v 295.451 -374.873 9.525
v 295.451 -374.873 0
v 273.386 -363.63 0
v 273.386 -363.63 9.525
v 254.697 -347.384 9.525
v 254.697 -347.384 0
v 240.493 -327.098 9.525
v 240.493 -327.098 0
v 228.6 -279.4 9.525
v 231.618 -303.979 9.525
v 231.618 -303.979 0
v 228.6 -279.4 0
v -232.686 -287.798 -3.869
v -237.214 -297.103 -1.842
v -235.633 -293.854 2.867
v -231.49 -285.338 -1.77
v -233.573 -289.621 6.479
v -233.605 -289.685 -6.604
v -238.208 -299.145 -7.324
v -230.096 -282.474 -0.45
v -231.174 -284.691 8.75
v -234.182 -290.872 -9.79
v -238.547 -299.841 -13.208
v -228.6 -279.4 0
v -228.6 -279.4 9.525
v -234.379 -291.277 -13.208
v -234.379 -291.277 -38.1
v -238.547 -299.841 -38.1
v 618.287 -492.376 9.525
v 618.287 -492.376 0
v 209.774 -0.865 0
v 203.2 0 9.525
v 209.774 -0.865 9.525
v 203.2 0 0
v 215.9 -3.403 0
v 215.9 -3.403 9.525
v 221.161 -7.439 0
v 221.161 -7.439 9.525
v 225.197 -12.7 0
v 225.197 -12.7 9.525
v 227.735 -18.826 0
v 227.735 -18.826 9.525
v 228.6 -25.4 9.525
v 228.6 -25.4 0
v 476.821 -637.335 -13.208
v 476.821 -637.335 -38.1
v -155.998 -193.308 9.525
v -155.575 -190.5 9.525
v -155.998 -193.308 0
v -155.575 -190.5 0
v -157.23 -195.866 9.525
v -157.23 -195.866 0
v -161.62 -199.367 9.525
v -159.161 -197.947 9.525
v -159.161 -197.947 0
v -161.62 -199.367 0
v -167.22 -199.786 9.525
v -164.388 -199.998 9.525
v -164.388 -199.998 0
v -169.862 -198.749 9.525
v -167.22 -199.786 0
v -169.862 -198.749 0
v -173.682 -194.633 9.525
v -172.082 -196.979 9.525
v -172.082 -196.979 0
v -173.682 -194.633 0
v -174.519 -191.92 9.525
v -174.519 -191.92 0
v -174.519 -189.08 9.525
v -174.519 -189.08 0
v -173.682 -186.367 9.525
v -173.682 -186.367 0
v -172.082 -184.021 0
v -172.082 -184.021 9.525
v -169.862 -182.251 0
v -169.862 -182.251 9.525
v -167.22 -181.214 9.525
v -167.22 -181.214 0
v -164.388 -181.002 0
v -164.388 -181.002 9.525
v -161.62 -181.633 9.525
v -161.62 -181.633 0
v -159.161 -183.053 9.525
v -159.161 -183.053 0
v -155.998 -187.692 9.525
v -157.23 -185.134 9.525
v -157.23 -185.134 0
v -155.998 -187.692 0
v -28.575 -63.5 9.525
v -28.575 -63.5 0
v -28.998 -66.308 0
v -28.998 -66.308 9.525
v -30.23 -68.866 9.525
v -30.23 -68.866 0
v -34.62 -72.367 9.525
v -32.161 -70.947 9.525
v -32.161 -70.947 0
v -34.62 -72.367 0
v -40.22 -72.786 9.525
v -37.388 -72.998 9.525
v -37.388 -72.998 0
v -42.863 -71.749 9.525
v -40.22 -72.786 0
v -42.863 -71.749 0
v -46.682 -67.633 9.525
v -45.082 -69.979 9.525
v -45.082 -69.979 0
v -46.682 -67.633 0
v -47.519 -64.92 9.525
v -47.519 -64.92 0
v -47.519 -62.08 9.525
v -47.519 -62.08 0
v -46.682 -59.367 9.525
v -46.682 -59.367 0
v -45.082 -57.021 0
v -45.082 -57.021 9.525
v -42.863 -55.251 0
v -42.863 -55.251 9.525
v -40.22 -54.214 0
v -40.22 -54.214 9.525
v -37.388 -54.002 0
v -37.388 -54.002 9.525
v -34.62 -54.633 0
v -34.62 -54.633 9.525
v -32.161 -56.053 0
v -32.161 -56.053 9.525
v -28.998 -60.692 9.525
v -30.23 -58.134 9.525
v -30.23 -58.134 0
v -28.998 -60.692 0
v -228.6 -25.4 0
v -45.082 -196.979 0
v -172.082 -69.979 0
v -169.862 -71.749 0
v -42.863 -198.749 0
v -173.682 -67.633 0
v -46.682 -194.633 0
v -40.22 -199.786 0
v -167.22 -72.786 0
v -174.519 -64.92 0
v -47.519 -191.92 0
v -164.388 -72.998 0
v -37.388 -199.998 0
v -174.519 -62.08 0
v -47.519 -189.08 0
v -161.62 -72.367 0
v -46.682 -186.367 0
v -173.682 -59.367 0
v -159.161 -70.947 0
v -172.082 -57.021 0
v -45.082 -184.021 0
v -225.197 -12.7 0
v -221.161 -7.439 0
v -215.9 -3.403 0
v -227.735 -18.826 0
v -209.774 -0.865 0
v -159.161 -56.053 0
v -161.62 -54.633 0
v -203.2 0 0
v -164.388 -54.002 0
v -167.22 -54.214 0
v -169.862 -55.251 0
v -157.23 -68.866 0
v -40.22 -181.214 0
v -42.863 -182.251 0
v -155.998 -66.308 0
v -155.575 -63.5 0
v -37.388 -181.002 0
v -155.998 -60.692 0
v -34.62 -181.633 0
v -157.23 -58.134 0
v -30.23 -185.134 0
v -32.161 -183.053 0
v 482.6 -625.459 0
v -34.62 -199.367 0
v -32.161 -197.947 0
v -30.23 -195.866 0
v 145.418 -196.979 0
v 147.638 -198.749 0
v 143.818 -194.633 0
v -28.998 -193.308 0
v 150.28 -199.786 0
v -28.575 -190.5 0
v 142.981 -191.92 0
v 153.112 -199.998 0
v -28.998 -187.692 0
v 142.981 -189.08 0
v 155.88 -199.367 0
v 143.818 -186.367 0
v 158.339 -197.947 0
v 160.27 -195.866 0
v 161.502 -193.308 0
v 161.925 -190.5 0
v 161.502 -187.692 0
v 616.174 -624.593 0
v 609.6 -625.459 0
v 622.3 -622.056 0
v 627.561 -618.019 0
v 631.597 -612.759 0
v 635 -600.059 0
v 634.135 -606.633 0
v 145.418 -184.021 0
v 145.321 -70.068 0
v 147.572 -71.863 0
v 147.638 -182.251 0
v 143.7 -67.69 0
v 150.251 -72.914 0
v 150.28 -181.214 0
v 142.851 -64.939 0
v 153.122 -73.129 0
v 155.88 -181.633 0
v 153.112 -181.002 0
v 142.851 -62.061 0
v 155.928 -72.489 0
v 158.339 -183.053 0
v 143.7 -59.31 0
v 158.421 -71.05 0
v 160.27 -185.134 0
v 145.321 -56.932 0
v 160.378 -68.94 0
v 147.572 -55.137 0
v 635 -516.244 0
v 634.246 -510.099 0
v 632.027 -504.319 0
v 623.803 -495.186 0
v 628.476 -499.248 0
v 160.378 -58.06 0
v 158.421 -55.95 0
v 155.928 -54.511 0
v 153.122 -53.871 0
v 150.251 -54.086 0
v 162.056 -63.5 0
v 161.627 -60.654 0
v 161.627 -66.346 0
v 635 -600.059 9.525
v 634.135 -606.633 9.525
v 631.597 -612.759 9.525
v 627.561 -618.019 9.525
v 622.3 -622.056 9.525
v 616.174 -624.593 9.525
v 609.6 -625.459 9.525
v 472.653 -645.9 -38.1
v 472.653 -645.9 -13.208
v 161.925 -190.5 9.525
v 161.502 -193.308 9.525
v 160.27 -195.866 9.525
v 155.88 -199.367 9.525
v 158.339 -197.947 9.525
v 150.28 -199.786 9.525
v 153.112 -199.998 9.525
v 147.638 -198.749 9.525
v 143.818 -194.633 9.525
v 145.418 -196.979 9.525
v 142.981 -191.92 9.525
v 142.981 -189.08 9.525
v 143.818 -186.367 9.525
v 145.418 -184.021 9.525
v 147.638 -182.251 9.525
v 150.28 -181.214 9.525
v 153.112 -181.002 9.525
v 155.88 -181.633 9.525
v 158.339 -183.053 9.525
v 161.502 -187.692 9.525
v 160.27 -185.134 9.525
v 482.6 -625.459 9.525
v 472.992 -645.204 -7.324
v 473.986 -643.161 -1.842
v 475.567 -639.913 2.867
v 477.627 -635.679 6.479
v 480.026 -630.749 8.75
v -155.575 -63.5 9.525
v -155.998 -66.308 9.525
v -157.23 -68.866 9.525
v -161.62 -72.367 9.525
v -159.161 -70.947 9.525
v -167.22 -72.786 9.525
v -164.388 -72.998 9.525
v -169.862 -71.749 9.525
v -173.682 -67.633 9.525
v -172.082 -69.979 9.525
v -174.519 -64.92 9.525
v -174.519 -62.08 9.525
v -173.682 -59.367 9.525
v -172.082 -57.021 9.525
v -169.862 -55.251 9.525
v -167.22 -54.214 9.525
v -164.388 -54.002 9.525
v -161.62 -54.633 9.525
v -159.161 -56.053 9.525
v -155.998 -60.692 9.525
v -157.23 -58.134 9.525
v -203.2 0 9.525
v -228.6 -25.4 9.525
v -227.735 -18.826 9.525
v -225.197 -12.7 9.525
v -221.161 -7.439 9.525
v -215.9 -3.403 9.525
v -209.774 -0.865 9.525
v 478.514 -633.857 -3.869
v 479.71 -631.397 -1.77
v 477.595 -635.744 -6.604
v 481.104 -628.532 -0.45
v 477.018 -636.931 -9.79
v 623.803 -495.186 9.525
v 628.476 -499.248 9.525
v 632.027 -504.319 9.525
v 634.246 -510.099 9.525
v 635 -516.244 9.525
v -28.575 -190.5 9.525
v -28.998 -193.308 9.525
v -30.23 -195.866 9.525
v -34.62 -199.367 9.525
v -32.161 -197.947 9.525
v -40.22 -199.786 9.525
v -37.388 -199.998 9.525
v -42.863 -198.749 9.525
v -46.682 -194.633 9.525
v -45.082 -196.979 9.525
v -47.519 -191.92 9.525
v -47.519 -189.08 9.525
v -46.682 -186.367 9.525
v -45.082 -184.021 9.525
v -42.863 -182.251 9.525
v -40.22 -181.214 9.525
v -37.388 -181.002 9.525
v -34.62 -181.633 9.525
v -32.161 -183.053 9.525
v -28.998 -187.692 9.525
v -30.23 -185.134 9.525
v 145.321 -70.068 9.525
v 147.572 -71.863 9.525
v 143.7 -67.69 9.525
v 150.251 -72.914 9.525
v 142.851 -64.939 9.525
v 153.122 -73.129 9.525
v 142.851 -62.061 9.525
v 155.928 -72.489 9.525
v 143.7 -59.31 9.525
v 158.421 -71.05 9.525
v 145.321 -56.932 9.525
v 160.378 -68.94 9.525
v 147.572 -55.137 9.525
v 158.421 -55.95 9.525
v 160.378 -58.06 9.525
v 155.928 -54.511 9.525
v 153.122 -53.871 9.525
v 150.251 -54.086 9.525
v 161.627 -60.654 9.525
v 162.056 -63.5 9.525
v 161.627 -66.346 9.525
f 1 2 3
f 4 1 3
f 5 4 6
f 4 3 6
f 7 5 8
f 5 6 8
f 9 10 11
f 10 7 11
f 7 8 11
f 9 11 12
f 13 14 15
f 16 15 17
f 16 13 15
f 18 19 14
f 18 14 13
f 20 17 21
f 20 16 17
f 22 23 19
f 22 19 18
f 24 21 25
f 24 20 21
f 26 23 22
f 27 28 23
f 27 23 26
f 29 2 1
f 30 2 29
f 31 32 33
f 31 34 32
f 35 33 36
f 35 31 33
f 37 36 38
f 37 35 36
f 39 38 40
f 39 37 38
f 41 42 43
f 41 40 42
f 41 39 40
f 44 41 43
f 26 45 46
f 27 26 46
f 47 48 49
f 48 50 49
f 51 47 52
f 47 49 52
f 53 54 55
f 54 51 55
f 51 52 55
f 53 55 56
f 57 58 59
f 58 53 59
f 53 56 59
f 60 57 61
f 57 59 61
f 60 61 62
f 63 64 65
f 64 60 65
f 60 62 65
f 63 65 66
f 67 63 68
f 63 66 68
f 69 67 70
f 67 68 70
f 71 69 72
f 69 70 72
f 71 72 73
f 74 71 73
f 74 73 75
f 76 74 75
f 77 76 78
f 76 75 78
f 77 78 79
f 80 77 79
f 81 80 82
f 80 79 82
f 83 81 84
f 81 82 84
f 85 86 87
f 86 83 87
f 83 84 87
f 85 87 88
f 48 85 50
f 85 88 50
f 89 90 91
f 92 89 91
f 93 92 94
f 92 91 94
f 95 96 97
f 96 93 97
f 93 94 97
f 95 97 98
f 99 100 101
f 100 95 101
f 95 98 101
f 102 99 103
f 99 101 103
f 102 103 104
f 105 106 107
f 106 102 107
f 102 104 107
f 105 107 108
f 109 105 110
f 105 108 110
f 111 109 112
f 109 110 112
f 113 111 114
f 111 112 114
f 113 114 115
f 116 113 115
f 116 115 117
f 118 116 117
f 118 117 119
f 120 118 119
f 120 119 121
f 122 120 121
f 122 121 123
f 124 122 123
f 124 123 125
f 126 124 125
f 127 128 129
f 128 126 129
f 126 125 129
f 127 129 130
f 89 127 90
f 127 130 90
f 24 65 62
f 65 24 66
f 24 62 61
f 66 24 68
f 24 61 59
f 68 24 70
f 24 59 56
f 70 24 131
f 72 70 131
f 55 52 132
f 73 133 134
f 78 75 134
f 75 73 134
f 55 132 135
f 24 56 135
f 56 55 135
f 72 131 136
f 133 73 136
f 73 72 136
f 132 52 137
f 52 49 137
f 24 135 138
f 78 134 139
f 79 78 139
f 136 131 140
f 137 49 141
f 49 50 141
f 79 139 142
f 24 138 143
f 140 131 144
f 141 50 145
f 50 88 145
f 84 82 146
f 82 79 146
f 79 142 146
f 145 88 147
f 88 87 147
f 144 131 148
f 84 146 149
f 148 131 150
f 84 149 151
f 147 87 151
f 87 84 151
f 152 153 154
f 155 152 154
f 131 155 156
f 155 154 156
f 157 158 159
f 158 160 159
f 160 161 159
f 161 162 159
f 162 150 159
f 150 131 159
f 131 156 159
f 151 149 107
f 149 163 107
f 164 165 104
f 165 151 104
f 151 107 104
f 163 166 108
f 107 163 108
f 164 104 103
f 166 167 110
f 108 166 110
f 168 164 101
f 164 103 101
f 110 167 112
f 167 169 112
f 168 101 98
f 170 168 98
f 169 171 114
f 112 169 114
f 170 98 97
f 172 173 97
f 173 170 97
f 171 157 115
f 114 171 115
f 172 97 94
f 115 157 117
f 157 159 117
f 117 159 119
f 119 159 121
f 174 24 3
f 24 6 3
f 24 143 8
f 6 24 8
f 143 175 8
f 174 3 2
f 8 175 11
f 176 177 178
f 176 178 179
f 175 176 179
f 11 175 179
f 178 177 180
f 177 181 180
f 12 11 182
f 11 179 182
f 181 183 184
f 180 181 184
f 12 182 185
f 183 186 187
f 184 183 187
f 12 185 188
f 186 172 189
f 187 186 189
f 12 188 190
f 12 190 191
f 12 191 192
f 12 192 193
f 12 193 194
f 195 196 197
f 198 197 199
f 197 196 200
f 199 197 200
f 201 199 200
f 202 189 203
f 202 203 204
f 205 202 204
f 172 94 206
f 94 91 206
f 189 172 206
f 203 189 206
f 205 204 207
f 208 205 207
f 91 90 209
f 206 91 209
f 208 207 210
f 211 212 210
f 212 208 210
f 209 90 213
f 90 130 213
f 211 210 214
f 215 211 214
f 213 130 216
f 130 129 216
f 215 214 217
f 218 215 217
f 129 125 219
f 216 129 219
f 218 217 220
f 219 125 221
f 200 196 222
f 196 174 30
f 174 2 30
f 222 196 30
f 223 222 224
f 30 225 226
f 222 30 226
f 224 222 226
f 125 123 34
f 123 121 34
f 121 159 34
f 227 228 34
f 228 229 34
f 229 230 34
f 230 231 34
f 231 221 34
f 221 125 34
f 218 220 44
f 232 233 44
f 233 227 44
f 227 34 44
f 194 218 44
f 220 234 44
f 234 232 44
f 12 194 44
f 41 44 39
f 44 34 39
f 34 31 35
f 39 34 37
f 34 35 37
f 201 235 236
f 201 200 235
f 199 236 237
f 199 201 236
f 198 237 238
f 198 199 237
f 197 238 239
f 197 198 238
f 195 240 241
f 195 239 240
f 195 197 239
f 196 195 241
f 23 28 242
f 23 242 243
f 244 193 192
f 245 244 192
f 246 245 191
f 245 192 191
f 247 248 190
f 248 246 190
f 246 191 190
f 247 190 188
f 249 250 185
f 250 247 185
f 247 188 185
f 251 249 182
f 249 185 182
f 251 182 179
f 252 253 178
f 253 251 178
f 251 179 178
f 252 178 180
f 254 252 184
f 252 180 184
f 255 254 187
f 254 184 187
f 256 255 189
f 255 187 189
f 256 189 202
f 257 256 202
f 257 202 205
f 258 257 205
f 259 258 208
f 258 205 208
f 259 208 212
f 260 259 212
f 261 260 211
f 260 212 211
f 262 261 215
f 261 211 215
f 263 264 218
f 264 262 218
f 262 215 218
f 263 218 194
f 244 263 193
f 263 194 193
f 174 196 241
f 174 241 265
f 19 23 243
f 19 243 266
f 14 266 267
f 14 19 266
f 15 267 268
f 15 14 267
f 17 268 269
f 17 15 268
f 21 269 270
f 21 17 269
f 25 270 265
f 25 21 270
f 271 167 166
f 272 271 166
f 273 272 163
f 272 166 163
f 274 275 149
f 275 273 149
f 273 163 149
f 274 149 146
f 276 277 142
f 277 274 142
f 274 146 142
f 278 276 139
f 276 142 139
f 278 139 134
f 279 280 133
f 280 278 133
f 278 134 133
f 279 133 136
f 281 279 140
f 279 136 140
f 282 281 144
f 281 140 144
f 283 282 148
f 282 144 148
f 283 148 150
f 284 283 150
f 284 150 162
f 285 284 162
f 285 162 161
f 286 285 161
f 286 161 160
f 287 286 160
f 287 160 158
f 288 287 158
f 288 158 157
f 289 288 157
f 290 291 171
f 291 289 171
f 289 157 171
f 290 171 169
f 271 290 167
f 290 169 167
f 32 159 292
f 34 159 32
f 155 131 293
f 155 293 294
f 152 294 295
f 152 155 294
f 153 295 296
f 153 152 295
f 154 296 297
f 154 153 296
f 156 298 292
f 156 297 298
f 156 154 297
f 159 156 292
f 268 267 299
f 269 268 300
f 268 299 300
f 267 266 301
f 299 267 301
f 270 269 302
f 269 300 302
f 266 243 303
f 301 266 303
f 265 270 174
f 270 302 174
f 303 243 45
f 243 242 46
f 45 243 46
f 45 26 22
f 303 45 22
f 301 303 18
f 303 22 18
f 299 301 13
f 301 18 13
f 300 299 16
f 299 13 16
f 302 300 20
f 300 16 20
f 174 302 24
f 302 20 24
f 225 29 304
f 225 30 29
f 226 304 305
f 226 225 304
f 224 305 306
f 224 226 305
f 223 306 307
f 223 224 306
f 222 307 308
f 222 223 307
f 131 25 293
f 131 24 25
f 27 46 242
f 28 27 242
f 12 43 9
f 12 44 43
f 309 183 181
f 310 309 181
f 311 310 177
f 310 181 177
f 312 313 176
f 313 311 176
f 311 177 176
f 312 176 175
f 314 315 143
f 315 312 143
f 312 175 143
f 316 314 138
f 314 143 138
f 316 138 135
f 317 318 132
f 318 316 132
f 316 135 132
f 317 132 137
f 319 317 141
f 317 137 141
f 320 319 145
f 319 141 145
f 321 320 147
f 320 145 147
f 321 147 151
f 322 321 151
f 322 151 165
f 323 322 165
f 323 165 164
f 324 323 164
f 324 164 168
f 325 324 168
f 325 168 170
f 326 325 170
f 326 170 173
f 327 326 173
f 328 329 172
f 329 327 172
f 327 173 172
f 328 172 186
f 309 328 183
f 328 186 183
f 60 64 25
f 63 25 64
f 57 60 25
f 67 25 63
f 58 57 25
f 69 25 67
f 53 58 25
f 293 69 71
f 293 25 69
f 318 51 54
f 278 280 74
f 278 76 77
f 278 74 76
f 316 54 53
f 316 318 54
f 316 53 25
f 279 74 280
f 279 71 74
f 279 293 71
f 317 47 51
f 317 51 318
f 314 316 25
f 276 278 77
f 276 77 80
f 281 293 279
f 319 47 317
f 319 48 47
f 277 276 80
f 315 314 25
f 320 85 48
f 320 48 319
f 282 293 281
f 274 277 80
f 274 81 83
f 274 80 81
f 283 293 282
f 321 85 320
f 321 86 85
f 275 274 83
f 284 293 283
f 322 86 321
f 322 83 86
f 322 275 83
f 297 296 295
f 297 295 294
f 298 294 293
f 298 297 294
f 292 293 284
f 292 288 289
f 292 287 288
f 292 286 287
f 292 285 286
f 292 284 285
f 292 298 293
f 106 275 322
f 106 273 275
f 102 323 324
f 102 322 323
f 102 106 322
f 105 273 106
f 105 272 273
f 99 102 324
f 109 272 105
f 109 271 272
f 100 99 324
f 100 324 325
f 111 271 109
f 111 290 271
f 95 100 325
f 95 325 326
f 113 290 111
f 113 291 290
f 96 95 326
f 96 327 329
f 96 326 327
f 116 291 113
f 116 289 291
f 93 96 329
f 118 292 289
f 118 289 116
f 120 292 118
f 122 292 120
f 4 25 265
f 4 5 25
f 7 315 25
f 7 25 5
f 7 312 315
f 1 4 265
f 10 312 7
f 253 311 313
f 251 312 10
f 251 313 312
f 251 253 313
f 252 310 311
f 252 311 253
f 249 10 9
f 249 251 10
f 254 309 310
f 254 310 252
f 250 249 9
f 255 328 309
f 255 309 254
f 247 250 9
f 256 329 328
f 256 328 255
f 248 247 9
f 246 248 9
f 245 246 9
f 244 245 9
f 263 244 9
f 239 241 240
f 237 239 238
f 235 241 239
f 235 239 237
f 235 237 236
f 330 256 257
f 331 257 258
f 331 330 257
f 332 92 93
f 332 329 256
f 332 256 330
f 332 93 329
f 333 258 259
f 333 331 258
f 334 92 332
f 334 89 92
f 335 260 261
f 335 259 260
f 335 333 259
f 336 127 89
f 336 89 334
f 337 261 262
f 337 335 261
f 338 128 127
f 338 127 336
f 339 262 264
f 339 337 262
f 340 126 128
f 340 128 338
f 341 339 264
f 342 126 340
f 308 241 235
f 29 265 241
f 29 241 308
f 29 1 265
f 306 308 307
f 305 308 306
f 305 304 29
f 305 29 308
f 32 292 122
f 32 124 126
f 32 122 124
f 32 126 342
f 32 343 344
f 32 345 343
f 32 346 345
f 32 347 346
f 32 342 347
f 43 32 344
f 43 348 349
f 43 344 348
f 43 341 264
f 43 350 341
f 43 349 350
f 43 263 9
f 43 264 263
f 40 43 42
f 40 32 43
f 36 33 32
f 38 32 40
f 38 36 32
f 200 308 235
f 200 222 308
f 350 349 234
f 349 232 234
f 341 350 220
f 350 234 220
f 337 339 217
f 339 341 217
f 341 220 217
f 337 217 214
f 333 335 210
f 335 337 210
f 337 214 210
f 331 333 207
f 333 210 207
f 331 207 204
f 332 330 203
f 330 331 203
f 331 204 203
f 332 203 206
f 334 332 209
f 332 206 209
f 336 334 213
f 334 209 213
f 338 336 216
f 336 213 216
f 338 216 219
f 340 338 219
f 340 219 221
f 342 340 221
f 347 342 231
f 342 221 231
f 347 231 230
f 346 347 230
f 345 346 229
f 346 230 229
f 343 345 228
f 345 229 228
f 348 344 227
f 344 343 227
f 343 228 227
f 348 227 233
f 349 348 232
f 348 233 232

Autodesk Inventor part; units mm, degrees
ref_plane "YZ Plane" through (0, 0, 0) normal (1, 0, 0) x (0, 1, 0)
ref_plane "XZ Plane" through (0, 0, 0) normal (0, 1, 0) x (-1, 0, 0)
ref_plane "XY Plane" through (0, 0, 0) normal (0, 0, 1) x (1, 0, 0)
sketch "Sketch1" plane through (0, 0, 0) normal (0, 0, 1) x (1, 0, 0)
  line L0 (-203.2, 0) -> (203.2, 0)
  line L1 (-228.6, -279.4) -> (-228.6, -25.4)
  line L2 (228.6, -25.4) -> (228.6, -279.4)
  line L3 (295.4508, -374.8728) -> (618.2873, -492.3757)
  line L4 (635, -516.2439) -> (635, -600.0586)
  line L5 (609.6, -625.4586) -> (482.6, -625.4586)
  line L6 (482.6, -625.4586) -> (-228.6, -279.4)
  arc A0 (228.6, -279.4) -> (295.4508, -374.8728) centre (330.2, -279.4) ccw
  line L7 (-165.1, -190.5) -> (-38.1, -190.5) construction
  line L8 (-38.1, -190.5) -> (-38.1, -63.5) construction
  line L9 (-38.1, -63.5) -> (-165.1, -63.5) construction
  line L10 (-165.1, -63.5) -> (-165.1, -190.5) construction
  line L11 (-165.1, -190.5) -> (-38.1, -63.5) construction
  line L12 (-38.1, -190.5) -> (-165.1, -63.5) construction
  circle A1 centre (-165.1, -63.5) radius 9.525
  circle A2 centre (-38.1, -63.5) radius 9.525
  circle A3 centre (-38.1, -190.5) radius 9.525
  circle A4 centre (-165.1, -190.5) radius 9.525
  circle A5 centre (152.4, -63.5) radius 9.6564
  circle A6 centre (152.4, -190.5) radius 9.525
  arc A7 (635, -516.2439) -> (618.2873, -492.3757) centre (609.6, -516.2439) ccw
  arc A8 (609.6, -625.4586) -> (635, -600.0586) centre (609.6, -600.0586) ccw
  arc A9 (228.6, -25.4) -> (203.2, 0) centre (203.2, -25.4) ccw
  arc A10 (-203.2, 0) -> (-228.6, -25.4) centre (-203.2, -25.4) ccw
  point P0 (0, 0)
  point P1 (-228.6, 0)
  point P2 (228.6, 0)
  point P3 (0, 0)
  point P4 (635, -498.4586)
  point P5 (635, -625.4586)
  point P6 (-101.6, -127)
  point P7 (635, -558.1512)
  point P8 (546.1, -625.4586)
  dimension "d0" = 127
  dimension "d1" = 457.2
  dimension "d2" = 101.6
  dimension "d3" = 110
  dimension "d5" = 152.4
  dimension "d7" = 19.05
  dimension "d8" = 127
  dimension "d9" = 127
  dimension "d10" = 63.5
  dimension "d11" = 63.5
  dimension "d12" = 76.2
  dimension "d13" = 635
  dimension "d14" = 25.4
  dimension "d16" = 254
extrude "Plate1" add sketch "Sketch1" along normal blind 9.525
sketch "Sketch2" plane through (-234.379, -291.2766, -13.208) normal (-0.4375367, -0.8992006, 0) x (0.8992006, -0.4375367, 0)
  line L0 (790.9248, 0) -> (0, 0)
  line L1 (0, 0) -> (0, -24.892)
  line L2 (0, -24.892) -> (790.9248, -24.892)
  line L3 (790.9248, -24.892) -> (790.9248, 0)
edge flange "Flange1" height 38.1 angle 90 thickness 9.525 bend radius 13.208 thickness toward (-0.4375367, -0.8992006, 0) relief tear relief width 9.525 relief depth 4.7625 edges at (127, -452.4293, 0) wall of the first edge with corners at (476.821, -637.3352, -13.208) (-234.379, -291.2766, -13.208) (-234.379, -291.2766, -38.1) (476.821, -637.3352, -38.1)
bend "Bend1"
corner "Corner1"
equation "\"d15\" = Thickness"
equation "\"d19\" = BendReliefWidth"
equation "\"d20\" = BendReliefDepth"
equation "\"d21\" = MinimumRemnant"
equation "\"d22\" = TransitionRadius"
equation "\"d25\" = BendRadius"
equation "\"d26\" = CornerReliefSize"
equation "\"d27\" = GapSize"
equation "\"d28\" = JacobiRadiusSize"
equation "\"BendReliefWidth\" = Thickness"
equation "\"BendReliefDepth\" = 0.5 * Thickness"
equation "\"CornerReliefSize\" = 4 * Thickness"
equation "\"MinimumRemnant\" = 2 * Thickness"
equation "\"TransitionRadius\" = BendRadius"
equation "\"JacobiRadiusSize\" = Thickness"
equation "\"GapSize\" = Thickness"
equation "\"Thickness\" = 9.525"
equation "\"BendRadius\" = 13.208"
properties part number "Model-2_Sheet-LH" material "SS304"
